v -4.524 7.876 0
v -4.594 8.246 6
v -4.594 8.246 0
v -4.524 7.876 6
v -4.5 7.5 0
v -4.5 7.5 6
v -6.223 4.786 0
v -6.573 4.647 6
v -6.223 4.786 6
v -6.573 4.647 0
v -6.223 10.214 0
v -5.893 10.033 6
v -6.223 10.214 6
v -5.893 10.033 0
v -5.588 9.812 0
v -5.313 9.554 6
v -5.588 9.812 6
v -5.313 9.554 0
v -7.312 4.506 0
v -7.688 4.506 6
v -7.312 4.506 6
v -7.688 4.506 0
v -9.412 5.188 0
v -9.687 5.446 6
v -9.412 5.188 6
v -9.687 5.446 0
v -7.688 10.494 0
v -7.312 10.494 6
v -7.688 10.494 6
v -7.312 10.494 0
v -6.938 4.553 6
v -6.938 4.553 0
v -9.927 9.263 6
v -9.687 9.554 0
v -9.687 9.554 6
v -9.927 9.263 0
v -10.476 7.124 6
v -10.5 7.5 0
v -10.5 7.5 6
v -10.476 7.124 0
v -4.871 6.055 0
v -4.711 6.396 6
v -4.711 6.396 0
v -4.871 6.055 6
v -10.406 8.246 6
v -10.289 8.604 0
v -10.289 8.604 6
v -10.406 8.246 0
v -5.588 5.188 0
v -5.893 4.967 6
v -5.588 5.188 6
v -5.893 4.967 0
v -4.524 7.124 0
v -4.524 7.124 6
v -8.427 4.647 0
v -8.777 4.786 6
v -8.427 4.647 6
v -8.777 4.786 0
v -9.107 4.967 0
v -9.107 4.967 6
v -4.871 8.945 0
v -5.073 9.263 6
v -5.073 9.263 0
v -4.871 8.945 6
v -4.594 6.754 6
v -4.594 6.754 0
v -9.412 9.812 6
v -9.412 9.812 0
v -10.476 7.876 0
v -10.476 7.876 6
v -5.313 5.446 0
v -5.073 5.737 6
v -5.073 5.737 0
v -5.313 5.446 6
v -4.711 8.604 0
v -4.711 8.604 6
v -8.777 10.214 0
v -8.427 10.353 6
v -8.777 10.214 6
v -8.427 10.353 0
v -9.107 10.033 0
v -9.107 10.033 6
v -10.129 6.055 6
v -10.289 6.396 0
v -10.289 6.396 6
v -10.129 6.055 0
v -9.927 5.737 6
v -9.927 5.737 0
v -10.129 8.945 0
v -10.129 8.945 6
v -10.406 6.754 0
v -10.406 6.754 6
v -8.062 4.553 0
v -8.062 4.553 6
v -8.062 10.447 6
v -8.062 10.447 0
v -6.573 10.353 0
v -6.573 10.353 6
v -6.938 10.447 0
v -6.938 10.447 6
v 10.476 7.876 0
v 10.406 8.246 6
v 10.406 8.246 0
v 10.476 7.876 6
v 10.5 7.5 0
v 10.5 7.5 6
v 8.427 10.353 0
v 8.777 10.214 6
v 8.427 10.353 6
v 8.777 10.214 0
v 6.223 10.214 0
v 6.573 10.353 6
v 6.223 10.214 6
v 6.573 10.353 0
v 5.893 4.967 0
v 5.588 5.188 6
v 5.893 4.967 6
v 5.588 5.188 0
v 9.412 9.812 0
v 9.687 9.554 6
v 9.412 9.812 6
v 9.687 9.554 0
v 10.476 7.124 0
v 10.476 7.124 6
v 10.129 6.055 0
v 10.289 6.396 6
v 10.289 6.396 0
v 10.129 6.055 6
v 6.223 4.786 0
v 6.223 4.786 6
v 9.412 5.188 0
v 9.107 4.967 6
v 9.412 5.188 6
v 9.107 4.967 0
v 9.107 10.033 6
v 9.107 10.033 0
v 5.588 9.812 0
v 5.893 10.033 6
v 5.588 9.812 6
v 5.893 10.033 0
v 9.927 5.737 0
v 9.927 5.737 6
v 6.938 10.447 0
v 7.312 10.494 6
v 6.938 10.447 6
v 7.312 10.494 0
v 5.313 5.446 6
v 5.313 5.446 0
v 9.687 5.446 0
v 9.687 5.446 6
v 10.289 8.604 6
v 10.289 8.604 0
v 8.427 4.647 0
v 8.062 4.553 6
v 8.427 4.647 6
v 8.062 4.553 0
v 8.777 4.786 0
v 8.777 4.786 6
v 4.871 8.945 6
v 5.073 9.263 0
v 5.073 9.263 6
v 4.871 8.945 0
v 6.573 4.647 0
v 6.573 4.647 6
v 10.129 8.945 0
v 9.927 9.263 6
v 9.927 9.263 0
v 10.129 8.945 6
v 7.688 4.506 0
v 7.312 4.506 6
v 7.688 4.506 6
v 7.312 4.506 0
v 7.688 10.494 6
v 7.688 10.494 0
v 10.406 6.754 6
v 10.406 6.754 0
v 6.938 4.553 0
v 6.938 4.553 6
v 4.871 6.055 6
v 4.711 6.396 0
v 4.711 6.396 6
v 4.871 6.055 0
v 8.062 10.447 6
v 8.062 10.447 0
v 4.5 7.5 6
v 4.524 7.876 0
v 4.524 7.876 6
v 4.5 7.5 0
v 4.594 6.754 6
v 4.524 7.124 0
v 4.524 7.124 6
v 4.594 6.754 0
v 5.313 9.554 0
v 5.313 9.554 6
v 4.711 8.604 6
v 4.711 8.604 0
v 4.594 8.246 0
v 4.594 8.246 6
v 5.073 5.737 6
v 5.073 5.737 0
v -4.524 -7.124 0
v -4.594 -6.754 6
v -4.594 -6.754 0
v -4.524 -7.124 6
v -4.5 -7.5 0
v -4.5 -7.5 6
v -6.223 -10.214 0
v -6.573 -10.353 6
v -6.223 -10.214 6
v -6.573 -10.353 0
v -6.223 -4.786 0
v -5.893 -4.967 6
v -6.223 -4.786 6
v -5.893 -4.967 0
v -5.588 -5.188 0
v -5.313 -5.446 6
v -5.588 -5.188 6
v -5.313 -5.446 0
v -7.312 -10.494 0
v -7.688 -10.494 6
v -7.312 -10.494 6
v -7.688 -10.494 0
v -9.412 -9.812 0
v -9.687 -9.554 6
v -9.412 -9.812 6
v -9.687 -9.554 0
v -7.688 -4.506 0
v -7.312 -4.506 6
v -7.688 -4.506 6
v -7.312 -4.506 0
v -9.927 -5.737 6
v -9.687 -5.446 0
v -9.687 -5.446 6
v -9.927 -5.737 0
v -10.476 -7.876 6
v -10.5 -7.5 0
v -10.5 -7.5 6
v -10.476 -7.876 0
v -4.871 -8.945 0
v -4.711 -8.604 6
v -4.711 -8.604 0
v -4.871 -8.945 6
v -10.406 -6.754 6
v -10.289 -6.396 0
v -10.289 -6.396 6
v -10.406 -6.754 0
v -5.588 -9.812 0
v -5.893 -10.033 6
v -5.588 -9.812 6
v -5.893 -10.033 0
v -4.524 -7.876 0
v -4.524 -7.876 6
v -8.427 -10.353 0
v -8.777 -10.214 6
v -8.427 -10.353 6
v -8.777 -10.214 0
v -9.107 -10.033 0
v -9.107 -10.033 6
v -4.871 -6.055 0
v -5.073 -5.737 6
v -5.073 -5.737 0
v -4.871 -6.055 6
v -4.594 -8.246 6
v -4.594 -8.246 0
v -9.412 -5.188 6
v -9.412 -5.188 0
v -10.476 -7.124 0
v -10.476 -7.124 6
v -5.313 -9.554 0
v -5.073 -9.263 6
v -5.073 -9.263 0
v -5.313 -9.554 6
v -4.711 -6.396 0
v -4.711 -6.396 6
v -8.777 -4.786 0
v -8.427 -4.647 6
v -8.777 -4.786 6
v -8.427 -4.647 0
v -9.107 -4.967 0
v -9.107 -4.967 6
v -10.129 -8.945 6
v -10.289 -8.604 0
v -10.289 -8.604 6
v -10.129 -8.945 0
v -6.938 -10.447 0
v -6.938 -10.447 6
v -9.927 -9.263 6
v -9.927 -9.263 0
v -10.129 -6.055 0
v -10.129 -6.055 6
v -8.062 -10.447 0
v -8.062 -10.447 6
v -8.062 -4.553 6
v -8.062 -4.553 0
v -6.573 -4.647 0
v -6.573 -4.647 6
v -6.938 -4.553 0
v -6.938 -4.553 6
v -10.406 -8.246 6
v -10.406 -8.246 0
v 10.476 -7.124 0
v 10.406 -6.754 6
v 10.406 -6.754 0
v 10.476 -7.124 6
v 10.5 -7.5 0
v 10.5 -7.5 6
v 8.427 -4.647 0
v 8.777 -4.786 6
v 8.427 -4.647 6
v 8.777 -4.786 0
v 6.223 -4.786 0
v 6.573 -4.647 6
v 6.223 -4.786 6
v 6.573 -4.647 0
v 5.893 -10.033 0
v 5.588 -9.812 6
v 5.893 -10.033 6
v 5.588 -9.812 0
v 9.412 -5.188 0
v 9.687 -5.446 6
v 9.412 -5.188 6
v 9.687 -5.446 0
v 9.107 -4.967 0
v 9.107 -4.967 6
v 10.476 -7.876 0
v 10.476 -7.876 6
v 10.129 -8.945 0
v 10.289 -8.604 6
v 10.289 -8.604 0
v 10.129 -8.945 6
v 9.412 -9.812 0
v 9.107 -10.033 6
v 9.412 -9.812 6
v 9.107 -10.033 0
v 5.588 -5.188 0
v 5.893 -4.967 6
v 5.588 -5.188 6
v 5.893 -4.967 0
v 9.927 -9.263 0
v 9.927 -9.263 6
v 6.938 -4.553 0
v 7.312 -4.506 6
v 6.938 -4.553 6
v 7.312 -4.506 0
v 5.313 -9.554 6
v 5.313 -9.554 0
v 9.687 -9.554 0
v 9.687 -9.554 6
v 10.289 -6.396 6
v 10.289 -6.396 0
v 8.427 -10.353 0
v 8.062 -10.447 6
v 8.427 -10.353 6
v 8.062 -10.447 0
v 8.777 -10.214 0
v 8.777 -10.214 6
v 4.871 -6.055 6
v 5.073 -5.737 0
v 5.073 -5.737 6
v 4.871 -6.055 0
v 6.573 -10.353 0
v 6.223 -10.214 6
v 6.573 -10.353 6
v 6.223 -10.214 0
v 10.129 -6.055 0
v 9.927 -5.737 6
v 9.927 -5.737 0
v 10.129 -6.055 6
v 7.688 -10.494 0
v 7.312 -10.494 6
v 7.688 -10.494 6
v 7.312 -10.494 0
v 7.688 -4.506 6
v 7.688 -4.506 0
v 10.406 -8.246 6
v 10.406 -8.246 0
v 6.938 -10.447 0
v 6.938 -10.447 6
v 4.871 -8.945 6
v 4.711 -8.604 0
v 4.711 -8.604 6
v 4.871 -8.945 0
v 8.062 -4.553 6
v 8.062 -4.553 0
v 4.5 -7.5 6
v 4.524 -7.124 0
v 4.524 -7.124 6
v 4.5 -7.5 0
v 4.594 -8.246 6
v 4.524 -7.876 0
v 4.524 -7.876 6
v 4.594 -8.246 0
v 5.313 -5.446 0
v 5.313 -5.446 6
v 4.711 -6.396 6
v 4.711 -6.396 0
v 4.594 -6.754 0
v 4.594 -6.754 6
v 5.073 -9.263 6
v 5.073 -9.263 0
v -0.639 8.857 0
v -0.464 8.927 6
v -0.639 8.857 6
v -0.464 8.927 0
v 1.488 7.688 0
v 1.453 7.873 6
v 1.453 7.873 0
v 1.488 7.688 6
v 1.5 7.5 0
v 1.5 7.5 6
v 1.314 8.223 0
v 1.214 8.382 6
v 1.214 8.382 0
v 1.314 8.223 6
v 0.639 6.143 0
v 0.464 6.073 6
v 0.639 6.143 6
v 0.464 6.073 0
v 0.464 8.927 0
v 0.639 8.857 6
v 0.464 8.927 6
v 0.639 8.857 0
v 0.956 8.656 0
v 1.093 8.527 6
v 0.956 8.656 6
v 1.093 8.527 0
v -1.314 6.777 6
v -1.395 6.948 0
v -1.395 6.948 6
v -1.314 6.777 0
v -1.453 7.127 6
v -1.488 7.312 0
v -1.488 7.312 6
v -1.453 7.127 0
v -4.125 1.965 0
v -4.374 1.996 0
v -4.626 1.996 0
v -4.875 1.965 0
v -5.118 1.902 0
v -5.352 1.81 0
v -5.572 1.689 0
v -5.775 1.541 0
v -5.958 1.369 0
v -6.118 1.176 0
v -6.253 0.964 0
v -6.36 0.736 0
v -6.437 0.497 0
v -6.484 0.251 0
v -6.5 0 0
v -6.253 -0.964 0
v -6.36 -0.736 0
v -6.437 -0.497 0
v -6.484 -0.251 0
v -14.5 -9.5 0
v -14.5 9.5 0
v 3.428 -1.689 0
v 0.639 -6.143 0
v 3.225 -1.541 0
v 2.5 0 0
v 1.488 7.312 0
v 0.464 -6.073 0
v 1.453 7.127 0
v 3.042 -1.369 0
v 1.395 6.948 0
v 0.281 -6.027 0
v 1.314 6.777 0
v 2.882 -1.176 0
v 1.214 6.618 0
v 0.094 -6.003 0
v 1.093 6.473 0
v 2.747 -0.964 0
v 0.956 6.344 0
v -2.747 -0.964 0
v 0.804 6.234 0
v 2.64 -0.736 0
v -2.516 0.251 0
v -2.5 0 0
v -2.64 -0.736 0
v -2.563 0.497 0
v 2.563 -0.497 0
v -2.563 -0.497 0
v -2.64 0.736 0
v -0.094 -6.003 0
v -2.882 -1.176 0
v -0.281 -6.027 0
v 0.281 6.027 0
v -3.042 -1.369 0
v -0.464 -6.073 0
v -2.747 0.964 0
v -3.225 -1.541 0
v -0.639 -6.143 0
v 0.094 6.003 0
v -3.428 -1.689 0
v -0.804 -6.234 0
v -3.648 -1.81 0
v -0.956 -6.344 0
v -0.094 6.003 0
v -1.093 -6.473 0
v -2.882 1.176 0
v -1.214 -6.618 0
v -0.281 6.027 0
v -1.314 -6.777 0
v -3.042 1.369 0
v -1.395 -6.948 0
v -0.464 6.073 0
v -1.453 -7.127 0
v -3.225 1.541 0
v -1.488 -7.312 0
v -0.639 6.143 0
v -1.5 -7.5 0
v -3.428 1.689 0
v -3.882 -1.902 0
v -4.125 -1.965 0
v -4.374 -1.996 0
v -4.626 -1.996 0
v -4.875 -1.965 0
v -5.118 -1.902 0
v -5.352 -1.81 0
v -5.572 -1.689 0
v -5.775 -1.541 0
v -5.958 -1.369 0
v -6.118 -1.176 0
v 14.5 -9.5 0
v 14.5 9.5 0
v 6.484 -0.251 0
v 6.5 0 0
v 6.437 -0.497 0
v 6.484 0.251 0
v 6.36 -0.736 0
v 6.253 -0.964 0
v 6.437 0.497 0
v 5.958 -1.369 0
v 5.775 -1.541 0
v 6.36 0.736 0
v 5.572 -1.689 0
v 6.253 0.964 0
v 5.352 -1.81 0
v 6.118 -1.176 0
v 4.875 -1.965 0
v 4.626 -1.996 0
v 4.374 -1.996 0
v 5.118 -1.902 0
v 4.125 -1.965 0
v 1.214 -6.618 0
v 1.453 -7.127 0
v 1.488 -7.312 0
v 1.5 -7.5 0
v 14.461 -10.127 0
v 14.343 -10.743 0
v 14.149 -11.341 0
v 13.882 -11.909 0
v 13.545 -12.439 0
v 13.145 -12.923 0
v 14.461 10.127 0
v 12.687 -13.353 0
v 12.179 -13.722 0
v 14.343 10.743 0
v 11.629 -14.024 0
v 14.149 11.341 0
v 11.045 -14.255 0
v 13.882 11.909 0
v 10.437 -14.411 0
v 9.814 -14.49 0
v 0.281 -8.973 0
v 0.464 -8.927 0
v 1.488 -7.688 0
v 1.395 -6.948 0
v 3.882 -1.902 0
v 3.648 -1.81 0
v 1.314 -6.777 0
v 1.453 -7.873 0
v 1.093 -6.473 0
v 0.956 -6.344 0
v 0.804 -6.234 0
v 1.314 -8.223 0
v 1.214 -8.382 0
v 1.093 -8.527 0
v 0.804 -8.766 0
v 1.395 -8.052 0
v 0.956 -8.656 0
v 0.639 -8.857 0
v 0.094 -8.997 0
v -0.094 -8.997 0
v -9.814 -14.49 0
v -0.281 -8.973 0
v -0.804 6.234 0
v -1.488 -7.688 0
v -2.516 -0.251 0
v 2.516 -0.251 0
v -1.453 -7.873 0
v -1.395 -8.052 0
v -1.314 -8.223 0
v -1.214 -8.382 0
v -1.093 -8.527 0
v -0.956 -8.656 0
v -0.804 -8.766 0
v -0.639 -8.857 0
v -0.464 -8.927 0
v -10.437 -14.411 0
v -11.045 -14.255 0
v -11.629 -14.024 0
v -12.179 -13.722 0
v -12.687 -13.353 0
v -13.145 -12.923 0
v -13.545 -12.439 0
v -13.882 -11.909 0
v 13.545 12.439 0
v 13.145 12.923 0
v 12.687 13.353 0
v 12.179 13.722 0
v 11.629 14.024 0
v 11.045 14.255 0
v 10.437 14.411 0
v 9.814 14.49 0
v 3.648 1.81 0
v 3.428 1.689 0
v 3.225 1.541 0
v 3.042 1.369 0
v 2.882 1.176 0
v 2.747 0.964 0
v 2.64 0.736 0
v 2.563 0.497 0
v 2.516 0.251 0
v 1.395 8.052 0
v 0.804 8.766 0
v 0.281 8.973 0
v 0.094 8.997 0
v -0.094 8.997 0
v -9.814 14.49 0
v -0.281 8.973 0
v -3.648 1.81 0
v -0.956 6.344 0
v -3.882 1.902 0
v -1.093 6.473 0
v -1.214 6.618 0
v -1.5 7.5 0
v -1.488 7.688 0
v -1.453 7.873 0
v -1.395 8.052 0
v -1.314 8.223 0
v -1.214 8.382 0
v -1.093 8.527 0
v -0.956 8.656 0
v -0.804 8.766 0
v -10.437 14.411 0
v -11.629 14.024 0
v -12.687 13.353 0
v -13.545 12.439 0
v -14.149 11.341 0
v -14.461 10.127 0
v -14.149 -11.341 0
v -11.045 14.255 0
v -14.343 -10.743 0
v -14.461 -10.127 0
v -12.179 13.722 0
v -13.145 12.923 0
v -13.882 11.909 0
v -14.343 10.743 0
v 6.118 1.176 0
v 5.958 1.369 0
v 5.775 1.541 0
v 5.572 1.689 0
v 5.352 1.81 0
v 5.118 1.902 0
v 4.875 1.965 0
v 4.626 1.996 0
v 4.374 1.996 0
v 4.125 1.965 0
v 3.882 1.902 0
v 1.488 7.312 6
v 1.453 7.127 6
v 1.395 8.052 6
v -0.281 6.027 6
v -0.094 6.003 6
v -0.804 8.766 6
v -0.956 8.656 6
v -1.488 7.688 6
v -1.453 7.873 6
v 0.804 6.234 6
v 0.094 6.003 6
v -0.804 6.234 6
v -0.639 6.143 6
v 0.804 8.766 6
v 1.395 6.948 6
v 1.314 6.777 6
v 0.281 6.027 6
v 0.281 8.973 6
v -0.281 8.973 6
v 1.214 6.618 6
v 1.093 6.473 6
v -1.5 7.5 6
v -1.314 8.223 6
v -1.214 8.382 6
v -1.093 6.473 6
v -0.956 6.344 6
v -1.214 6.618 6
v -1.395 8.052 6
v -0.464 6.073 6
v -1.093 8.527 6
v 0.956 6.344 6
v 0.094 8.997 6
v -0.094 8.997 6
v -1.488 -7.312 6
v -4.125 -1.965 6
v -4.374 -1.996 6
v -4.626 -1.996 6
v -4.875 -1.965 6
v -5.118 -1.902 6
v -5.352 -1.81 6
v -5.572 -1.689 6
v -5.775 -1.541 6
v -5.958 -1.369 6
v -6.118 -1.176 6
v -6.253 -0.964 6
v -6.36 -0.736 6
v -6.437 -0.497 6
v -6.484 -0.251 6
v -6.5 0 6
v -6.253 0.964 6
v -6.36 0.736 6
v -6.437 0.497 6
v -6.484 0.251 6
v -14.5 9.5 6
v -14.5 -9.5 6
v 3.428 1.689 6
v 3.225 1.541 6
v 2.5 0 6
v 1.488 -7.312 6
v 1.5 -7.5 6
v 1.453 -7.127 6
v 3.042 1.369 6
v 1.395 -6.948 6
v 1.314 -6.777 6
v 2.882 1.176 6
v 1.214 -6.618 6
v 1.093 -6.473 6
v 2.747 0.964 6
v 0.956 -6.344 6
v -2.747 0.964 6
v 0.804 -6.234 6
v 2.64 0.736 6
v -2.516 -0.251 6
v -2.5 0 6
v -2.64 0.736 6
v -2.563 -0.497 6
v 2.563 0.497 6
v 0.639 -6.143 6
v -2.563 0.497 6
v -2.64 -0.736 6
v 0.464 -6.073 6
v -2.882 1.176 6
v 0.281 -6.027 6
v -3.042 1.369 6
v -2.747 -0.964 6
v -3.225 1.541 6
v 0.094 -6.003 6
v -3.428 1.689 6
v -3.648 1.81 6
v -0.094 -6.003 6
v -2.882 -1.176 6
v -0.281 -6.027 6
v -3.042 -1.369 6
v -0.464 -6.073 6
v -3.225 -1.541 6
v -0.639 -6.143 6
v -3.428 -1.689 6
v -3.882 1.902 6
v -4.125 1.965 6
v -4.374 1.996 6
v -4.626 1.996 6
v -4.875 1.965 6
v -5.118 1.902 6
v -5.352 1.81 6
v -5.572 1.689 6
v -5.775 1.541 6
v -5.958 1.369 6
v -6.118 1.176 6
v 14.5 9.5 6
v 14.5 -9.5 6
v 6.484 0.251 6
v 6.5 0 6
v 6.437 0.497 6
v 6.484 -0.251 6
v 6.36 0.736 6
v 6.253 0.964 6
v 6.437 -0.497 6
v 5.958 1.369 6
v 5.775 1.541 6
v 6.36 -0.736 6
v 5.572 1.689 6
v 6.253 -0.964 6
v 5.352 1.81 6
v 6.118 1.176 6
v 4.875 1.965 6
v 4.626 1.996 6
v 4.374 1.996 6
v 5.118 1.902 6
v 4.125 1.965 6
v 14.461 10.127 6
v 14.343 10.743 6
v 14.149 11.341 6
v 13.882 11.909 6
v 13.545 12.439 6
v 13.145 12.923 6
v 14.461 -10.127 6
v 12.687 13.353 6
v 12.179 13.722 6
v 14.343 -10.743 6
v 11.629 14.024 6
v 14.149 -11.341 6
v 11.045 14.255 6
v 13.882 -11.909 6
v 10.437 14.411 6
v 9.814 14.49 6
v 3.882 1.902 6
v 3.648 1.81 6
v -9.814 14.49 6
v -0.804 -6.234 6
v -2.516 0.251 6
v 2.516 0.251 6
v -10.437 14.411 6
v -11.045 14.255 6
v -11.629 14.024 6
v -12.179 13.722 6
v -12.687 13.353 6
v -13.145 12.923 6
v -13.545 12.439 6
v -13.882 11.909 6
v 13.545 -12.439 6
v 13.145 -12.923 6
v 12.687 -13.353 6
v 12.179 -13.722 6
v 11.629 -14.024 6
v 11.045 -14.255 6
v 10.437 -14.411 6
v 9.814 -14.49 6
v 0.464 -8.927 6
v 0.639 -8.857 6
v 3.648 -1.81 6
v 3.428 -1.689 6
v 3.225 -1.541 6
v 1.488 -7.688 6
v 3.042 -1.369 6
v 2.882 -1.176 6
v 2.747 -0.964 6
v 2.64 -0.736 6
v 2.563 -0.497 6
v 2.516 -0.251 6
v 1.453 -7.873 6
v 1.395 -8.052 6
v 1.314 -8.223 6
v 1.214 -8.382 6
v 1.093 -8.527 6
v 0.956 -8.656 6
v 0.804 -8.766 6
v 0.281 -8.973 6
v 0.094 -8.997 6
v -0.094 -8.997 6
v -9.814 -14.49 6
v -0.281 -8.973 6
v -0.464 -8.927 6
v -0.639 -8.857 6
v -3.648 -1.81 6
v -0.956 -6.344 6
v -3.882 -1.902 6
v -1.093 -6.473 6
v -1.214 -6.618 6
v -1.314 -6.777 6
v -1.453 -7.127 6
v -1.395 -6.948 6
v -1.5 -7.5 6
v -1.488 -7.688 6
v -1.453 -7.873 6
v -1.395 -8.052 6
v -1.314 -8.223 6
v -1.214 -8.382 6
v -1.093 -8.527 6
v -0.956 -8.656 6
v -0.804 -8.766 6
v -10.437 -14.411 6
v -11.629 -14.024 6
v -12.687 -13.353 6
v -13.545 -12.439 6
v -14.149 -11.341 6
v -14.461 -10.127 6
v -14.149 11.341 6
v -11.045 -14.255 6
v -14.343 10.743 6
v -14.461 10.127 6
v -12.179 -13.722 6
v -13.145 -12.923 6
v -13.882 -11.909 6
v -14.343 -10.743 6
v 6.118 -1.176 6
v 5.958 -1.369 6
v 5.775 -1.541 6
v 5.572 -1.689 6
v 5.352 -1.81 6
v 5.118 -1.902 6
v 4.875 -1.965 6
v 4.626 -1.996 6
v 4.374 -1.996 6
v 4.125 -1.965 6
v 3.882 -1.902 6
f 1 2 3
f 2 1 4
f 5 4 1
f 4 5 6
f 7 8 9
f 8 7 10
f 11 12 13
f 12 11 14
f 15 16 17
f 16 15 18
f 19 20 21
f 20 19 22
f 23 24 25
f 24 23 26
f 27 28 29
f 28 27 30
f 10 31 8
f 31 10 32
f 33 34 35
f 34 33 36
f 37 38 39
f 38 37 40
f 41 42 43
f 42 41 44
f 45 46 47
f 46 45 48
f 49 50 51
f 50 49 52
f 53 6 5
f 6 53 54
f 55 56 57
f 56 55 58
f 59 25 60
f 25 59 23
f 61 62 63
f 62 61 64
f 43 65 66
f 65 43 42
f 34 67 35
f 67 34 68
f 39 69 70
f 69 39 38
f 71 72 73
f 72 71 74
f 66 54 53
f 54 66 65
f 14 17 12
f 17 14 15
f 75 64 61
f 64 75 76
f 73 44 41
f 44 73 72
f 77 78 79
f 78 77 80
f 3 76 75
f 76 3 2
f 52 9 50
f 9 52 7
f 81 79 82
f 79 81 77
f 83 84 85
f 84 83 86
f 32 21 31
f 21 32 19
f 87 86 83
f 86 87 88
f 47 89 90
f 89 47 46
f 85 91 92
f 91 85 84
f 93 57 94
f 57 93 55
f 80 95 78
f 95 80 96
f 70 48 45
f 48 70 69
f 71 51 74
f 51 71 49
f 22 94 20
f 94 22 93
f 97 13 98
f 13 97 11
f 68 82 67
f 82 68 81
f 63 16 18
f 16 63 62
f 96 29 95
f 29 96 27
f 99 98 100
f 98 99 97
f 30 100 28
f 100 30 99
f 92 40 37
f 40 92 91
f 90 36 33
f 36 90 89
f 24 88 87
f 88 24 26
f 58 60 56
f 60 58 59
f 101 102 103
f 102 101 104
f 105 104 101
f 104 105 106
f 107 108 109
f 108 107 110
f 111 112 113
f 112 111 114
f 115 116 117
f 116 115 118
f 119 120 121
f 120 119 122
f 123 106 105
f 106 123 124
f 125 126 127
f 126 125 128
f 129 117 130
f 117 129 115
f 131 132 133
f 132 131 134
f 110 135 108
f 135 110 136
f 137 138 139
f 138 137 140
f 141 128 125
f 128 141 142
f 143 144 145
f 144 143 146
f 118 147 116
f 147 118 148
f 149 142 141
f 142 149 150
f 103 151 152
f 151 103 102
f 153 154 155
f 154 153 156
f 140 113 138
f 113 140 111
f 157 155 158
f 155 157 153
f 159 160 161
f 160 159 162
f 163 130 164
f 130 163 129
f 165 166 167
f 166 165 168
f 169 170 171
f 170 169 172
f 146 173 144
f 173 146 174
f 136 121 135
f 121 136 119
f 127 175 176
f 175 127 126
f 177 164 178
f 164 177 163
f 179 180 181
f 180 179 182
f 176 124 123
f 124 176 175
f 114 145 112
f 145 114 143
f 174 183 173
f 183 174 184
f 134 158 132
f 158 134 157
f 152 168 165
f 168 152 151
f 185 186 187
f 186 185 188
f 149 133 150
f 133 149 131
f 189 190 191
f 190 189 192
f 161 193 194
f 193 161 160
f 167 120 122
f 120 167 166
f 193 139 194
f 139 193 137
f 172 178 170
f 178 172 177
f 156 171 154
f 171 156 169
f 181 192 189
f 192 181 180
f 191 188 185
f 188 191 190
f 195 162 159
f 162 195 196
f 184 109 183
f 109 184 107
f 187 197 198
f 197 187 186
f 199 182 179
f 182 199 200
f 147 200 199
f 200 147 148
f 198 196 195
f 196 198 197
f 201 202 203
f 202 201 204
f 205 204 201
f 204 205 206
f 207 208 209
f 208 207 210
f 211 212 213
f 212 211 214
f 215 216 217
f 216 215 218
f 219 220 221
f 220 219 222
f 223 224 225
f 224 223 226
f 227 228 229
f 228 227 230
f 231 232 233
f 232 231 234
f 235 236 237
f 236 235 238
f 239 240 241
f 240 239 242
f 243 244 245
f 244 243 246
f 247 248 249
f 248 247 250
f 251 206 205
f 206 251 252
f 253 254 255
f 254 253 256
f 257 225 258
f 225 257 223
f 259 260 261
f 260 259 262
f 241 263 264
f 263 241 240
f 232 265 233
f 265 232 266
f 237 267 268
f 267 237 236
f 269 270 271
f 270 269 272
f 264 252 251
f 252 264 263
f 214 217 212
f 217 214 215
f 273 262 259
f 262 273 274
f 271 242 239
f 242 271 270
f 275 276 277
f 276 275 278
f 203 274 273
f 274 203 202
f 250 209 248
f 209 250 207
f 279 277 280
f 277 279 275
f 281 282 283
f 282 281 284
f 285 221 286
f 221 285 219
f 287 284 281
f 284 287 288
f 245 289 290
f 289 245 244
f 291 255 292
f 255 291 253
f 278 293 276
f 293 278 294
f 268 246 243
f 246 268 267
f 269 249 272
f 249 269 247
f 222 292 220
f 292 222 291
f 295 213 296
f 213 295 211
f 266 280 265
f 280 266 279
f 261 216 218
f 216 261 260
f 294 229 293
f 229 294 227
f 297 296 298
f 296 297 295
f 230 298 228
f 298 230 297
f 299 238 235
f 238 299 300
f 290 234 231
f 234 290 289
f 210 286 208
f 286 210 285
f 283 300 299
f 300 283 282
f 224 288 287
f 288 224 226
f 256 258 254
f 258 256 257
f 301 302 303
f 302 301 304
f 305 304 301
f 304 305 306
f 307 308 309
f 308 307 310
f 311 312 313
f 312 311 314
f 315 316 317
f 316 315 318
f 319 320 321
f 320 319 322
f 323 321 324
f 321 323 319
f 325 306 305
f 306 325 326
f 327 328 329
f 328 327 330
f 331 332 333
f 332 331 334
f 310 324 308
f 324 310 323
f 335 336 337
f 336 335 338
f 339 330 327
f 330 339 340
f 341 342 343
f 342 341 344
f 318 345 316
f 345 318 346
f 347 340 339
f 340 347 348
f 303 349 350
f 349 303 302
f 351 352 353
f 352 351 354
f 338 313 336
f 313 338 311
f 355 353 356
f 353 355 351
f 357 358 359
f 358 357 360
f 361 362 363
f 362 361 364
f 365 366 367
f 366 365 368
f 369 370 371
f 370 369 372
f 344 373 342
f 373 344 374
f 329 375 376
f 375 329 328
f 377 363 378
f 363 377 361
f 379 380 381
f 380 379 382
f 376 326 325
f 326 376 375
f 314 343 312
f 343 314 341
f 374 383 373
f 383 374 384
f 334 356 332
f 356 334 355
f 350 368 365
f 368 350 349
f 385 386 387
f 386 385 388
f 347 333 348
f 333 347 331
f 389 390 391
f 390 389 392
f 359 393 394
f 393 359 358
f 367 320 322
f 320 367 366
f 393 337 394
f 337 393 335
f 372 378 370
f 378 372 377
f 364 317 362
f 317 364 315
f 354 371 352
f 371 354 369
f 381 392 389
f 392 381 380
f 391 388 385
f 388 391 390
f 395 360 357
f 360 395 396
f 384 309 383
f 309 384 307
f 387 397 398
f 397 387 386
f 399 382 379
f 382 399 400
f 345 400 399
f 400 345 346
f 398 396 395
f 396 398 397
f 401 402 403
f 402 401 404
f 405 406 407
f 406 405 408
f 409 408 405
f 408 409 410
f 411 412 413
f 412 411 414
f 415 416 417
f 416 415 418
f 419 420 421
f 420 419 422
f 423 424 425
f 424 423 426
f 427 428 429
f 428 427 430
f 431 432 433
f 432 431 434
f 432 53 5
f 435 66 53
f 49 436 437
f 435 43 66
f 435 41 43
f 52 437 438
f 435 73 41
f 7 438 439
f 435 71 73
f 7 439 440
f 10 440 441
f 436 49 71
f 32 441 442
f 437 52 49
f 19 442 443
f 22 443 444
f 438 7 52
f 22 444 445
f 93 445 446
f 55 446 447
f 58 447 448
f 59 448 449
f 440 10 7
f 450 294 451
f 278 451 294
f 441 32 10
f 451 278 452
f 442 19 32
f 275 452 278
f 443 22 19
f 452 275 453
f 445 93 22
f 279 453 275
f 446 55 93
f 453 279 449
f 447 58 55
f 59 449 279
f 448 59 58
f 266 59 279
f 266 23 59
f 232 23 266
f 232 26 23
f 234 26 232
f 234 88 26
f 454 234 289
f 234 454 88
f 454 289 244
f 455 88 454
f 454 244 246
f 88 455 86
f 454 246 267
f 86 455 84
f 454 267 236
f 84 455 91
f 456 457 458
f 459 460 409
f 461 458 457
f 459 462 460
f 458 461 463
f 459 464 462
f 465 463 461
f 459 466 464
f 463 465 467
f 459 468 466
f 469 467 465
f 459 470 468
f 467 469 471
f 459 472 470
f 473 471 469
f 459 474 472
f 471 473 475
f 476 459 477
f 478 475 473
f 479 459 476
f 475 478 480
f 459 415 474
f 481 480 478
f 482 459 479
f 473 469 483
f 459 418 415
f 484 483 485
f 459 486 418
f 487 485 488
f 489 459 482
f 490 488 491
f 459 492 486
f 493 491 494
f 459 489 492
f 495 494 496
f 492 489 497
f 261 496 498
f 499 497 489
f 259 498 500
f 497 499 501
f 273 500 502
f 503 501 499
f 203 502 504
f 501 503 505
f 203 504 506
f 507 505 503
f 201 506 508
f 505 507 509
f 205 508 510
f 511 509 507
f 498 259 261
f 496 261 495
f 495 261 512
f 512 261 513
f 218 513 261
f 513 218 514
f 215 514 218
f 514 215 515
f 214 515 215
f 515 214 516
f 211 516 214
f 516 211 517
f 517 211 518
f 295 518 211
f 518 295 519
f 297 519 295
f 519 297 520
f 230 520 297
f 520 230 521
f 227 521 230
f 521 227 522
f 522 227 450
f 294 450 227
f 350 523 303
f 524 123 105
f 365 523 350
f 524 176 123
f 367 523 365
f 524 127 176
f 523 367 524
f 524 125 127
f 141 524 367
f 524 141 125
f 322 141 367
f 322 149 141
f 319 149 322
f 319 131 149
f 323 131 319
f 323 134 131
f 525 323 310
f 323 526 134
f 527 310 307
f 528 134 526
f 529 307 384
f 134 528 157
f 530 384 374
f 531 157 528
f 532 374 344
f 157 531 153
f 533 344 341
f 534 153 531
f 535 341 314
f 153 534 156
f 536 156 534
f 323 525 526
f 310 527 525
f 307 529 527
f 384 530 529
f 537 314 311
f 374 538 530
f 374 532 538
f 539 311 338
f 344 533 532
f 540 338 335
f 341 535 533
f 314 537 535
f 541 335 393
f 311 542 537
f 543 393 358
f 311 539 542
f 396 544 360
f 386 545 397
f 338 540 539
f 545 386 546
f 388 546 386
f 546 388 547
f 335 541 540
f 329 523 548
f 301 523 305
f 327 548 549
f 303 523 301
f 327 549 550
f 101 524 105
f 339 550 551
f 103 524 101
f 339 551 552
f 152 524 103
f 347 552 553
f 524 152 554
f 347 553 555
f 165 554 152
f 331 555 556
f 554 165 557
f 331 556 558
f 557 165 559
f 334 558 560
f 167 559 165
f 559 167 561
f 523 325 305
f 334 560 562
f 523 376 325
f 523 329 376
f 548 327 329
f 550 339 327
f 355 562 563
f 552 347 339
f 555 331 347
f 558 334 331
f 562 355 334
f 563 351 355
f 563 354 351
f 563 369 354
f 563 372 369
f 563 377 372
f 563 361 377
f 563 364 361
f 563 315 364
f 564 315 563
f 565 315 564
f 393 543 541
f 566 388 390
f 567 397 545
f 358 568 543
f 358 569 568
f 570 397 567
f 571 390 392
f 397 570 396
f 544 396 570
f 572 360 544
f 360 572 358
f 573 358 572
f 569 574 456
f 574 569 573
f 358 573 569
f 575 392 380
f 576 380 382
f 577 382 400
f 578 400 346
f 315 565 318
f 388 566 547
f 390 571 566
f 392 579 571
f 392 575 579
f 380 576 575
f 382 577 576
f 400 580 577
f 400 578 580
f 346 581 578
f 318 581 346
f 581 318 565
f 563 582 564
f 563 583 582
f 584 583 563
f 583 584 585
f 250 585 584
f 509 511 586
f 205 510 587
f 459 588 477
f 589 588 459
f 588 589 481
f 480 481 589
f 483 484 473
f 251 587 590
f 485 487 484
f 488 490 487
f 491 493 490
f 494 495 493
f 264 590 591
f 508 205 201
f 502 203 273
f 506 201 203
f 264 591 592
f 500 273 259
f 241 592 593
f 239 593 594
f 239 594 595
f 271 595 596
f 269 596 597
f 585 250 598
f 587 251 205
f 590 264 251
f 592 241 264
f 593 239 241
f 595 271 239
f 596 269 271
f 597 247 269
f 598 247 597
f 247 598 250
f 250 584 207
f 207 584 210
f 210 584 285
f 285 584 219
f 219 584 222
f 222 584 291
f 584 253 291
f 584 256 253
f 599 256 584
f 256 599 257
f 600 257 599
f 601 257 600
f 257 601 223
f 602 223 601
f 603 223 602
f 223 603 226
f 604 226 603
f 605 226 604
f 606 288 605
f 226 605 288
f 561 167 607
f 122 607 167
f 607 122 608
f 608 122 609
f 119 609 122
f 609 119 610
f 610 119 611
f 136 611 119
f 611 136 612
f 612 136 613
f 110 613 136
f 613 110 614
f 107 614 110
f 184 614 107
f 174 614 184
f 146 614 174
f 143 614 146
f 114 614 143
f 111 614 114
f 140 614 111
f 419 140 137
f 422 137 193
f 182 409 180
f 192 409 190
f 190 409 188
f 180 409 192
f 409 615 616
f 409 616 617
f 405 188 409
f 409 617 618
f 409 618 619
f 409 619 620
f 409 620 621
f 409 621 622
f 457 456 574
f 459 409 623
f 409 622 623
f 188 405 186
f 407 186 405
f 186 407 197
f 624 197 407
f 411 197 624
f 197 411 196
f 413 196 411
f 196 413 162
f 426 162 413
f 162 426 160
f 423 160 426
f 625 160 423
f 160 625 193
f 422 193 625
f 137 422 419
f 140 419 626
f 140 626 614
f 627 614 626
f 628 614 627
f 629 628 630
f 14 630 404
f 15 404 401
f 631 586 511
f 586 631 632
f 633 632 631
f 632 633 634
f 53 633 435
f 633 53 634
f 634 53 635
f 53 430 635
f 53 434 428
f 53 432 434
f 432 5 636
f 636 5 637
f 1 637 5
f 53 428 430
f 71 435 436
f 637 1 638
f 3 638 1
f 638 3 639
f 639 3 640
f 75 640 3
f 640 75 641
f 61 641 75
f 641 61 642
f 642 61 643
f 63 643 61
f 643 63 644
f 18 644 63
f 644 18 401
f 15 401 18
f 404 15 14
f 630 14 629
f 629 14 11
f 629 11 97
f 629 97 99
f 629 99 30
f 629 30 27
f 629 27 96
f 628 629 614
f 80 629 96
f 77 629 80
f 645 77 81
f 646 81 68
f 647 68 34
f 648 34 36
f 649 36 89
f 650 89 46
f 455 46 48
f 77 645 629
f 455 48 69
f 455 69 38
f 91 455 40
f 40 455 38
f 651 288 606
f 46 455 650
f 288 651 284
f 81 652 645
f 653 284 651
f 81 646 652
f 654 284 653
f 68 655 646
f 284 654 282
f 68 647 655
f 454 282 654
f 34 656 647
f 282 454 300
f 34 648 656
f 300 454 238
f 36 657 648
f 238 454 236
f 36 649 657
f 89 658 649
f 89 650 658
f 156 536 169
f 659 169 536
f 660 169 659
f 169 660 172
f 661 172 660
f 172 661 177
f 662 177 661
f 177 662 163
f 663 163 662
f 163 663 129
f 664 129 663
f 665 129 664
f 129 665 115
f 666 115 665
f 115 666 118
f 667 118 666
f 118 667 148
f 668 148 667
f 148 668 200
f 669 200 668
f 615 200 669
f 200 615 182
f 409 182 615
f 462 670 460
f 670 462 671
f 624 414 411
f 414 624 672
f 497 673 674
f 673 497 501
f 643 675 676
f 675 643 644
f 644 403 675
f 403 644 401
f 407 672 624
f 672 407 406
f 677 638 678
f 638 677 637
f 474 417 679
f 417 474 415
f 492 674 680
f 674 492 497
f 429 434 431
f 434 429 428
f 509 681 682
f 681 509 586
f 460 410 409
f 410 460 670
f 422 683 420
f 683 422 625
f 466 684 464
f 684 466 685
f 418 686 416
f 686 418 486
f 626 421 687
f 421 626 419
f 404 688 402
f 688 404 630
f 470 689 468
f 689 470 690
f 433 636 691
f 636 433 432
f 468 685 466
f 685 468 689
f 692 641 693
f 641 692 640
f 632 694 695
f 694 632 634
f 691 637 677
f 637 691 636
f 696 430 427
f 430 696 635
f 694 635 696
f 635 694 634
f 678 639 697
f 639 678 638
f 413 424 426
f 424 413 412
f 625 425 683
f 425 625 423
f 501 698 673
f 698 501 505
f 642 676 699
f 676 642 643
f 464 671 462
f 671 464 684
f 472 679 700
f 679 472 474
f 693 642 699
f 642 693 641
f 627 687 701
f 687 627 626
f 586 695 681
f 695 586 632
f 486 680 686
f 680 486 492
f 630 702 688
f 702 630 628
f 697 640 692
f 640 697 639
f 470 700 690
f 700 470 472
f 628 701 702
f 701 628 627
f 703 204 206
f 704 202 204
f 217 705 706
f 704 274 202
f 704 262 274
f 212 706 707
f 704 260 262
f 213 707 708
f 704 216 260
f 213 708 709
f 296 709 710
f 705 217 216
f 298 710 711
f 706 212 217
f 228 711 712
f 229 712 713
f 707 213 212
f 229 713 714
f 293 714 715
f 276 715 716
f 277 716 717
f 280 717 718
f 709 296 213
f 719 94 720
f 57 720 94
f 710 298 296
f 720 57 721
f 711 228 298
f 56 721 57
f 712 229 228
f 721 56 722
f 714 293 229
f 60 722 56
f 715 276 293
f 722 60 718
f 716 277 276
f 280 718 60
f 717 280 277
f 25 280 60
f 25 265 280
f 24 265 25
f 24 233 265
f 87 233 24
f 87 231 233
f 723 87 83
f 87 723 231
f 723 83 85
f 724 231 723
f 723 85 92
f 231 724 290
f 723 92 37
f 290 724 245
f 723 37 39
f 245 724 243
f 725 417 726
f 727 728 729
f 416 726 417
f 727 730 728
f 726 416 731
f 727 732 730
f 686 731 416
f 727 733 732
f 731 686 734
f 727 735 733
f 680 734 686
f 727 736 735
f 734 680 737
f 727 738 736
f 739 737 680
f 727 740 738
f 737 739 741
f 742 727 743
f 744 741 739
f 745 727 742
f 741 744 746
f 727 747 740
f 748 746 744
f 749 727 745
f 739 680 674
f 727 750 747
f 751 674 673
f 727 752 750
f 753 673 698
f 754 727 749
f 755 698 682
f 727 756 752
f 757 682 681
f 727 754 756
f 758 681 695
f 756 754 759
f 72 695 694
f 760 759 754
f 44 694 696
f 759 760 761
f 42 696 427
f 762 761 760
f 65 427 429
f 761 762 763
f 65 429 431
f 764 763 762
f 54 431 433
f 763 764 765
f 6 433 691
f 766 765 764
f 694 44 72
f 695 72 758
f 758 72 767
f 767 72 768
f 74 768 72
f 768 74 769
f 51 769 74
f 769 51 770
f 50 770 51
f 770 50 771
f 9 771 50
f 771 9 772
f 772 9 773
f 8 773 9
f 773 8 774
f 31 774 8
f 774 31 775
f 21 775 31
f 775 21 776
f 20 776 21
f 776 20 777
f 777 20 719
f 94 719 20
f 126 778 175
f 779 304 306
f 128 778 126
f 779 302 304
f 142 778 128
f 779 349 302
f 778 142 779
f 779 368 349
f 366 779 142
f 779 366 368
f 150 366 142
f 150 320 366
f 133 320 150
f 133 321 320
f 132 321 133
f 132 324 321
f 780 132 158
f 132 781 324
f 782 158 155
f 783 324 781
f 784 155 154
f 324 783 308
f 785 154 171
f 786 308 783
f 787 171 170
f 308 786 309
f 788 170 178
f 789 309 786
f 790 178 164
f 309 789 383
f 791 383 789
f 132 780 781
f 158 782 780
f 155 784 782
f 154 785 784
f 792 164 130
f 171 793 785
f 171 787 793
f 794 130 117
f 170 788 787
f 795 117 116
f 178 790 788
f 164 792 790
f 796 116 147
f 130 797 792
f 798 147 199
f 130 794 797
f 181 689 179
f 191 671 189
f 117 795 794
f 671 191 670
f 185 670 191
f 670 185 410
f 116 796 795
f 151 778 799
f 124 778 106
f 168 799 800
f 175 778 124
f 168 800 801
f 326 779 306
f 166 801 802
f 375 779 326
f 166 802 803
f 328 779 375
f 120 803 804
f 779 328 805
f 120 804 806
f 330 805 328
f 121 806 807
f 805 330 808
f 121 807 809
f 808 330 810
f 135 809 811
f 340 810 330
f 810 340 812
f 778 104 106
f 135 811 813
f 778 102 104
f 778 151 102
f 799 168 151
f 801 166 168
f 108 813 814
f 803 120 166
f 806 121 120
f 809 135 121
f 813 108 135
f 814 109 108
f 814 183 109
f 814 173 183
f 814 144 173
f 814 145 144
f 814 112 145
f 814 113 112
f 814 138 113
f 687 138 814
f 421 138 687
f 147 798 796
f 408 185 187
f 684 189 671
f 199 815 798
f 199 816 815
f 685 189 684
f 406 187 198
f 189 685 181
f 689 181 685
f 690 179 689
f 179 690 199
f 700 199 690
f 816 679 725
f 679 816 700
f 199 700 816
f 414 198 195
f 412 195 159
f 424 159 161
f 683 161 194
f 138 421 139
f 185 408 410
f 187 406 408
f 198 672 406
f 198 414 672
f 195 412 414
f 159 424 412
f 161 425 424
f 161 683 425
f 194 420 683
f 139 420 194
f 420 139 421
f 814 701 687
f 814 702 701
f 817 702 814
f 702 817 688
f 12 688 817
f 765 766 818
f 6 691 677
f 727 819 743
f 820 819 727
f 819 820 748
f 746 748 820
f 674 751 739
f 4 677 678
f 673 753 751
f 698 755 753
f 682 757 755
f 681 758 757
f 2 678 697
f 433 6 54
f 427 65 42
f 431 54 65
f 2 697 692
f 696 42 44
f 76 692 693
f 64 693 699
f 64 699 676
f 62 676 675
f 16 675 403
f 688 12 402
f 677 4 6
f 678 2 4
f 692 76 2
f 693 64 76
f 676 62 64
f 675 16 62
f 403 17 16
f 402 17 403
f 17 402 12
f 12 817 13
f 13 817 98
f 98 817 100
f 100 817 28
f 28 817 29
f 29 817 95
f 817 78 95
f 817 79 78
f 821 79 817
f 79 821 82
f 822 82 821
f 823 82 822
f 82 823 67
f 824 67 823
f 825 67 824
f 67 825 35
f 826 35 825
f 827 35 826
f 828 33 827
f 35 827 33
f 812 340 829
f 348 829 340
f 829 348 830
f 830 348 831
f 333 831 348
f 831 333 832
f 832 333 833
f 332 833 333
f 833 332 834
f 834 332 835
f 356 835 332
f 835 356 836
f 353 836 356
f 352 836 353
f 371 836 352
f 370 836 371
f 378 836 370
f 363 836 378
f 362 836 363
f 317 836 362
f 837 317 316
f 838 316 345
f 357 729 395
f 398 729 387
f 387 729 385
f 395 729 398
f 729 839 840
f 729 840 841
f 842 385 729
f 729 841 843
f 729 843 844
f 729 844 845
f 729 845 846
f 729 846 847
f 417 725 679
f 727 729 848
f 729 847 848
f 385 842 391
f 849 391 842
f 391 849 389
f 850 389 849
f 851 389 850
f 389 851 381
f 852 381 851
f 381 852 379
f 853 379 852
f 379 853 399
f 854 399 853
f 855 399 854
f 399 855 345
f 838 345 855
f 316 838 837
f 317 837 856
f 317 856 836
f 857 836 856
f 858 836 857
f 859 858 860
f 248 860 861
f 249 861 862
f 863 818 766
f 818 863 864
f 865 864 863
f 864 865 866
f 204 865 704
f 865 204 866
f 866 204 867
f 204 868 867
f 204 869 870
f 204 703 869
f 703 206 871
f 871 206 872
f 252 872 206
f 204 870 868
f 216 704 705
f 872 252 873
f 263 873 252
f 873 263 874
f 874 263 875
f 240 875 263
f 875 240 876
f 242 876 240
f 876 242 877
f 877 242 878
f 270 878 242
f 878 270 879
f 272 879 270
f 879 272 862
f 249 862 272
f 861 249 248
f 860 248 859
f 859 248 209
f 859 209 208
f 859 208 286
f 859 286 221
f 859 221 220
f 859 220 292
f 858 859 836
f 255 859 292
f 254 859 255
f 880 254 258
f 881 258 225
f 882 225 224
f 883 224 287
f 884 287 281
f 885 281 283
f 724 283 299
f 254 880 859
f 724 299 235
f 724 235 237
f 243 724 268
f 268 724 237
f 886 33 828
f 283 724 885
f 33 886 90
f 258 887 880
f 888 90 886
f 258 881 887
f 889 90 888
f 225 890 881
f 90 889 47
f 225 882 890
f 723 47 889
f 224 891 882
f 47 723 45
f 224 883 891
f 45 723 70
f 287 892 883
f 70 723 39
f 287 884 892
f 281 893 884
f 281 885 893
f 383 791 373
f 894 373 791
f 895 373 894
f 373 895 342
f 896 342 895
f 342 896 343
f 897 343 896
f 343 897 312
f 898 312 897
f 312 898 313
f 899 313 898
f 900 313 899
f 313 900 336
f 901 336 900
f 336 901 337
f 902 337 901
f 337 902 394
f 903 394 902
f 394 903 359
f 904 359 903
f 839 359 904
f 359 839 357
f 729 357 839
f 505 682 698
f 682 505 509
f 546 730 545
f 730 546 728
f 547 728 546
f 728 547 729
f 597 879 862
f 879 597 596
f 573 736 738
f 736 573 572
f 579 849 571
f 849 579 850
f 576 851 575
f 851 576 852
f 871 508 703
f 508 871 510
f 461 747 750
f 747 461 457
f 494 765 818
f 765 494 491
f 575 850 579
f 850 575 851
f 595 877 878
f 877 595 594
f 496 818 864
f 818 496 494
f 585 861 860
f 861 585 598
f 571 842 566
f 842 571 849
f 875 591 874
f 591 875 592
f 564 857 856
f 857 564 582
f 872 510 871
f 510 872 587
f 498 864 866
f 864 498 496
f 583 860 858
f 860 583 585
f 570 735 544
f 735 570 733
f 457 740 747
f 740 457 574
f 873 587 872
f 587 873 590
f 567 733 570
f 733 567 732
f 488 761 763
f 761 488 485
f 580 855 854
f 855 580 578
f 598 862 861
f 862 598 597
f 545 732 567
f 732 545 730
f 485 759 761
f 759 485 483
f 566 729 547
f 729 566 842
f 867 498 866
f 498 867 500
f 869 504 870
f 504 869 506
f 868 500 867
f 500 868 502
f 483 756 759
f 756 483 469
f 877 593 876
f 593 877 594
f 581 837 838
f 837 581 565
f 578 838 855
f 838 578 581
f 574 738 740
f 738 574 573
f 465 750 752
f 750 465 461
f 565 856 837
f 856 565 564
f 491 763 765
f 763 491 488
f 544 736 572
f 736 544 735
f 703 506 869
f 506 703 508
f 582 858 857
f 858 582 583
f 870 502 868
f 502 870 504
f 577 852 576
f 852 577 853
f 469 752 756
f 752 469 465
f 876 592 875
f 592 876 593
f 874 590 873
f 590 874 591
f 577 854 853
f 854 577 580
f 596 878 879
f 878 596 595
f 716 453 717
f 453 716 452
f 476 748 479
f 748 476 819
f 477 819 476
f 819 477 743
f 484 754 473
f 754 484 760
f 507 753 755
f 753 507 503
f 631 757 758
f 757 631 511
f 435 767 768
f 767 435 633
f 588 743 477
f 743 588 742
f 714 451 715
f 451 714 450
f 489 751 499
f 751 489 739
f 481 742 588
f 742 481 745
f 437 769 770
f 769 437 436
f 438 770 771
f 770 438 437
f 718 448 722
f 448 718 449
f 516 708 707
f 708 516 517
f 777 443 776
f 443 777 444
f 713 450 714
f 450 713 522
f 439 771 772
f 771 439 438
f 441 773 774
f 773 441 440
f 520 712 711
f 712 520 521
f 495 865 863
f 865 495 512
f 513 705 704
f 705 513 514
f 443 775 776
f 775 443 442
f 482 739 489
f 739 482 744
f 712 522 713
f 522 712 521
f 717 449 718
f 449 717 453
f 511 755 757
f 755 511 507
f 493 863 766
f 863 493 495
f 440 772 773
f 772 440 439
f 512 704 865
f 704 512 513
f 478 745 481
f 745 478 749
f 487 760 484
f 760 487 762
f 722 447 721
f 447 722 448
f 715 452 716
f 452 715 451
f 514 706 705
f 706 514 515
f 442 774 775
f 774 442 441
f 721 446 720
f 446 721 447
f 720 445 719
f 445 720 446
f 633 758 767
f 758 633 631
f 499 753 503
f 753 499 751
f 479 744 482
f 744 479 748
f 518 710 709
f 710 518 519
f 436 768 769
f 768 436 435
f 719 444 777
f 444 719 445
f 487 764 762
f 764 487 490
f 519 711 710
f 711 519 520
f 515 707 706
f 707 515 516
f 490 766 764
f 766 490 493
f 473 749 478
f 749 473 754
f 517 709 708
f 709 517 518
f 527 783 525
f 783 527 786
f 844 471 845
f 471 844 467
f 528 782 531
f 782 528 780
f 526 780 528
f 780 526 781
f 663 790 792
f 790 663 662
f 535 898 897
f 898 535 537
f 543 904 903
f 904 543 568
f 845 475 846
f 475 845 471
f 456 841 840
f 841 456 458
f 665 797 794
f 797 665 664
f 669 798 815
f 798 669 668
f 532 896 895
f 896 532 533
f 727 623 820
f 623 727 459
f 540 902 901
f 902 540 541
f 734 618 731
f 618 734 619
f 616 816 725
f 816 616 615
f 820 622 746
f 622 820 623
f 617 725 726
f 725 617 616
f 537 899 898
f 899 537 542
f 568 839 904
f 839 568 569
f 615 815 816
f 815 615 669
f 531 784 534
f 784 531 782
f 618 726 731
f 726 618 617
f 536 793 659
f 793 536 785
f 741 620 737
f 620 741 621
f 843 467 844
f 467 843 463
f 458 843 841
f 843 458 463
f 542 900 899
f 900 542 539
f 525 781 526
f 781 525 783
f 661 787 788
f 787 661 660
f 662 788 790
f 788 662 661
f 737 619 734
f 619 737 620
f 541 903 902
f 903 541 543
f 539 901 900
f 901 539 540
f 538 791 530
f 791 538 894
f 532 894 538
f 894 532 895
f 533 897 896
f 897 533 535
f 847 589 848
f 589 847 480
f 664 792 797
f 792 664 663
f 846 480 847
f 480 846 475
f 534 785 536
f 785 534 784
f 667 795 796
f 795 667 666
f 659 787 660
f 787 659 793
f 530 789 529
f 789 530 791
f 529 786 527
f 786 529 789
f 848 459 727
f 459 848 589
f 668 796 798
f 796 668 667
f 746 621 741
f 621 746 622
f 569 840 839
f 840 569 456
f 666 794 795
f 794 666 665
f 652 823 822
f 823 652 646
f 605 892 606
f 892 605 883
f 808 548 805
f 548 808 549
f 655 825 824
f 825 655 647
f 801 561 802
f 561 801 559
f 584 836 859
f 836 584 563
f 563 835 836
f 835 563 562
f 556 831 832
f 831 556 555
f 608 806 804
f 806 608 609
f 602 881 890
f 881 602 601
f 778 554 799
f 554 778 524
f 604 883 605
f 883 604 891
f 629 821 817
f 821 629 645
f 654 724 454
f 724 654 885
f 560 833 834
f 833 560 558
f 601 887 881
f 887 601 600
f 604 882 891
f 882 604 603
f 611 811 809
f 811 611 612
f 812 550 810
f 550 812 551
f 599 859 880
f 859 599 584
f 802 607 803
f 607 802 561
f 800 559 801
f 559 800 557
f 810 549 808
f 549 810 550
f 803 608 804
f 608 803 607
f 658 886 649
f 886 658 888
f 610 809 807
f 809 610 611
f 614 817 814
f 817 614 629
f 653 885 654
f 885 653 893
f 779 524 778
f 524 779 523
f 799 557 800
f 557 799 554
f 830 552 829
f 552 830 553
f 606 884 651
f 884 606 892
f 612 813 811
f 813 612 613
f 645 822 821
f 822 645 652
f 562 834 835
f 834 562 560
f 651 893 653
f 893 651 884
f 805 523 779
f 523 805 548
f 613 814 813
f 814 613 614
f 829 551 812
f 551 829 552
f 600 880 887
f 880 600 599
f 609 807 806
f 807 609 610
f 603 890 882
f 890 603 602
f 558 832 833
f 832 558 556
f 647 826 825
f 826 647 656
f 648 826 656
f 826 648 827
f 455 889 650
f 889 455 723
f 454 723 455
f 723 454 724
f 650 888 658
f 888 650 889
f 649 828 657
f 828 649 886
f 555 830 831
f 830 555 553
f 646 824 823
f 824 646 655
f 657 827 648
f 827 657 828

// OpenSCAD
$fn = 50;


difference() {
	union() {
		hull() {
			translate(v = [-9.5000000000, 9.5000000000, 0]) {
				cylinder(h = 6, r = 5);
			}
			translate(v = [9.5000000000, 9.5000000000, 0]) {
				cylinder(h = 6, r = 5);
			}
			translate(v = [-9.5000000000, -9.5000000000, 0]) {
				cylinder(h = 6, r = 5);
			}
			translate(v = [9.5000000000, -9.5000000000, 0]) {
				cylinder(h = 6, r = 5);
			}
		}
	}
	union() {
		#translate(v = [-7.5000000000, 7.5000000000, 0]) {
			cylinder(h = 6, r = 3.0000000000);
		}
		#translate(v = [7.5000000000, 7.5000000000, 0]) {
			cylinder(h = 6, r = 3.0000000000);
		}
		#translate(v = [-7.5000000000, -7.5000000000, 0]) {
			cylinder(h = 6, r = 3.0000000000);
		}
		#translate(v = [7.5000000000, -7.5000000000, 0]) {
			cylinder(h = 6, r = 3.0000000000);
		}
		#translate(v = [-7.5000000000, -7.5000000000, -100.0000000000]) {
			cylinder(h = 200, r = 3.0000000000);
		}
		#translate(v = [-7.5000000000, 7.5000000000, -100.0000000000]) {
			cylinder(h = 200, r = 3.0000000000);
		}
		#translate(v = [7.5000000000, -7.5000000000, -100.0000000000]) {
			cylinder(h = 200, r = 3.0000000000);
		}
		#translate(v = [7.5000000000, 7.5000000000, -100.0000000000]) {
			cylinder(h = 200, r = 3.0000000000);
		}
		#translate(v = [-7.5000000000, 7.5000000000, 0]) {
			cylinder(h = 6, r = 1.5000000000);
		}
		#translate(v = [0.0000000000, 7.5000000000, 0]) {
			cylinder(h = 6, r = 1.5000000000);
		}
		#translate(v = [7.5000000000, 7.5000000000, 0]) {
			cylinder(h = 6, r = 1.5000000000);
		}
		#translate(v = [-7.5000000000, -7.5000000000, 0]) {
			cylinder(h = 6, r = 1.5000000000);
		}
		#translate(v = [0.0000000000, -7.5000000000, 0]) {
			cylinder(h = 6, r = 1.5000000000);
		}
		#translate(v = [7.5000000000, -7.5000000000, 0]) {
			cylinder(h = 6, r = 1.5000000000);
		}
		#translate(v = [-7.5000000000, 7.5000000000, 0]) {
			cylinder(h = 6, r = 1.5000000000);
		}
		#translate(v = [0.0000000000, 7.5000000000, 0]) {
			cylinder(h = 6, r = 1.5000000000);
		}
		#translate(v = [7.5000000000, 7.5000000000, 0]) {
			cylinder(h = 6, r = 1.5000000000);
		}
		#translate(v = [-7.5000000000, -7.5000000000, 0]) {
			cylinder(h = 6, r = 1.5000000000);
		}
		#translate(v = [0.0000000000, -7.5000000000, 0]) {
			cylinder(h = 6, r = 1.5000000000);
		}
		#translate(v = [7.5000000000, -7.5000000000, 0]) {
			cylinder(h = 6, r = 1.5000000000);
		}
		#translate(v = [-7.5000000000, 7.5000000000, 0]) {
			cylinder(h = 6, r = 1.5000000000);
		}
		#translate(v = [0.0000000000, 7.5000000000, 0]) {
			cylinder(h = 6, r = 1.5000000000);
		}
		#translate(v = [7.5000000000, 7.5000000000, 0]) {
			cylinder(h = 6, r = 1.5000000000);
		}
		#translate(v = [-7.5000000000, -7.5000000000, 0]) {
			cylinder(h = 6, r = 1.5000000000);
		}
		#translate(v = [0.0000000000, -7.5000000000, 0]) {
			cylinder(h = 6, r = 1.5000000000);
		}
		#translate(v = [7.5000000000, -7.5000000000, 0]) {
			cylinder(h = 6, r = 1.5000000000);
		}
		#translate(v = [-4.5000000000, 0, 0]) {
			cylinder(h = 6, r = 2.0000000000);
		}
		#translate(v = [4.5000000000, 0, 0]) {
			cylinder(h = 6, r = 2.0000000000);
		}
	}
}
